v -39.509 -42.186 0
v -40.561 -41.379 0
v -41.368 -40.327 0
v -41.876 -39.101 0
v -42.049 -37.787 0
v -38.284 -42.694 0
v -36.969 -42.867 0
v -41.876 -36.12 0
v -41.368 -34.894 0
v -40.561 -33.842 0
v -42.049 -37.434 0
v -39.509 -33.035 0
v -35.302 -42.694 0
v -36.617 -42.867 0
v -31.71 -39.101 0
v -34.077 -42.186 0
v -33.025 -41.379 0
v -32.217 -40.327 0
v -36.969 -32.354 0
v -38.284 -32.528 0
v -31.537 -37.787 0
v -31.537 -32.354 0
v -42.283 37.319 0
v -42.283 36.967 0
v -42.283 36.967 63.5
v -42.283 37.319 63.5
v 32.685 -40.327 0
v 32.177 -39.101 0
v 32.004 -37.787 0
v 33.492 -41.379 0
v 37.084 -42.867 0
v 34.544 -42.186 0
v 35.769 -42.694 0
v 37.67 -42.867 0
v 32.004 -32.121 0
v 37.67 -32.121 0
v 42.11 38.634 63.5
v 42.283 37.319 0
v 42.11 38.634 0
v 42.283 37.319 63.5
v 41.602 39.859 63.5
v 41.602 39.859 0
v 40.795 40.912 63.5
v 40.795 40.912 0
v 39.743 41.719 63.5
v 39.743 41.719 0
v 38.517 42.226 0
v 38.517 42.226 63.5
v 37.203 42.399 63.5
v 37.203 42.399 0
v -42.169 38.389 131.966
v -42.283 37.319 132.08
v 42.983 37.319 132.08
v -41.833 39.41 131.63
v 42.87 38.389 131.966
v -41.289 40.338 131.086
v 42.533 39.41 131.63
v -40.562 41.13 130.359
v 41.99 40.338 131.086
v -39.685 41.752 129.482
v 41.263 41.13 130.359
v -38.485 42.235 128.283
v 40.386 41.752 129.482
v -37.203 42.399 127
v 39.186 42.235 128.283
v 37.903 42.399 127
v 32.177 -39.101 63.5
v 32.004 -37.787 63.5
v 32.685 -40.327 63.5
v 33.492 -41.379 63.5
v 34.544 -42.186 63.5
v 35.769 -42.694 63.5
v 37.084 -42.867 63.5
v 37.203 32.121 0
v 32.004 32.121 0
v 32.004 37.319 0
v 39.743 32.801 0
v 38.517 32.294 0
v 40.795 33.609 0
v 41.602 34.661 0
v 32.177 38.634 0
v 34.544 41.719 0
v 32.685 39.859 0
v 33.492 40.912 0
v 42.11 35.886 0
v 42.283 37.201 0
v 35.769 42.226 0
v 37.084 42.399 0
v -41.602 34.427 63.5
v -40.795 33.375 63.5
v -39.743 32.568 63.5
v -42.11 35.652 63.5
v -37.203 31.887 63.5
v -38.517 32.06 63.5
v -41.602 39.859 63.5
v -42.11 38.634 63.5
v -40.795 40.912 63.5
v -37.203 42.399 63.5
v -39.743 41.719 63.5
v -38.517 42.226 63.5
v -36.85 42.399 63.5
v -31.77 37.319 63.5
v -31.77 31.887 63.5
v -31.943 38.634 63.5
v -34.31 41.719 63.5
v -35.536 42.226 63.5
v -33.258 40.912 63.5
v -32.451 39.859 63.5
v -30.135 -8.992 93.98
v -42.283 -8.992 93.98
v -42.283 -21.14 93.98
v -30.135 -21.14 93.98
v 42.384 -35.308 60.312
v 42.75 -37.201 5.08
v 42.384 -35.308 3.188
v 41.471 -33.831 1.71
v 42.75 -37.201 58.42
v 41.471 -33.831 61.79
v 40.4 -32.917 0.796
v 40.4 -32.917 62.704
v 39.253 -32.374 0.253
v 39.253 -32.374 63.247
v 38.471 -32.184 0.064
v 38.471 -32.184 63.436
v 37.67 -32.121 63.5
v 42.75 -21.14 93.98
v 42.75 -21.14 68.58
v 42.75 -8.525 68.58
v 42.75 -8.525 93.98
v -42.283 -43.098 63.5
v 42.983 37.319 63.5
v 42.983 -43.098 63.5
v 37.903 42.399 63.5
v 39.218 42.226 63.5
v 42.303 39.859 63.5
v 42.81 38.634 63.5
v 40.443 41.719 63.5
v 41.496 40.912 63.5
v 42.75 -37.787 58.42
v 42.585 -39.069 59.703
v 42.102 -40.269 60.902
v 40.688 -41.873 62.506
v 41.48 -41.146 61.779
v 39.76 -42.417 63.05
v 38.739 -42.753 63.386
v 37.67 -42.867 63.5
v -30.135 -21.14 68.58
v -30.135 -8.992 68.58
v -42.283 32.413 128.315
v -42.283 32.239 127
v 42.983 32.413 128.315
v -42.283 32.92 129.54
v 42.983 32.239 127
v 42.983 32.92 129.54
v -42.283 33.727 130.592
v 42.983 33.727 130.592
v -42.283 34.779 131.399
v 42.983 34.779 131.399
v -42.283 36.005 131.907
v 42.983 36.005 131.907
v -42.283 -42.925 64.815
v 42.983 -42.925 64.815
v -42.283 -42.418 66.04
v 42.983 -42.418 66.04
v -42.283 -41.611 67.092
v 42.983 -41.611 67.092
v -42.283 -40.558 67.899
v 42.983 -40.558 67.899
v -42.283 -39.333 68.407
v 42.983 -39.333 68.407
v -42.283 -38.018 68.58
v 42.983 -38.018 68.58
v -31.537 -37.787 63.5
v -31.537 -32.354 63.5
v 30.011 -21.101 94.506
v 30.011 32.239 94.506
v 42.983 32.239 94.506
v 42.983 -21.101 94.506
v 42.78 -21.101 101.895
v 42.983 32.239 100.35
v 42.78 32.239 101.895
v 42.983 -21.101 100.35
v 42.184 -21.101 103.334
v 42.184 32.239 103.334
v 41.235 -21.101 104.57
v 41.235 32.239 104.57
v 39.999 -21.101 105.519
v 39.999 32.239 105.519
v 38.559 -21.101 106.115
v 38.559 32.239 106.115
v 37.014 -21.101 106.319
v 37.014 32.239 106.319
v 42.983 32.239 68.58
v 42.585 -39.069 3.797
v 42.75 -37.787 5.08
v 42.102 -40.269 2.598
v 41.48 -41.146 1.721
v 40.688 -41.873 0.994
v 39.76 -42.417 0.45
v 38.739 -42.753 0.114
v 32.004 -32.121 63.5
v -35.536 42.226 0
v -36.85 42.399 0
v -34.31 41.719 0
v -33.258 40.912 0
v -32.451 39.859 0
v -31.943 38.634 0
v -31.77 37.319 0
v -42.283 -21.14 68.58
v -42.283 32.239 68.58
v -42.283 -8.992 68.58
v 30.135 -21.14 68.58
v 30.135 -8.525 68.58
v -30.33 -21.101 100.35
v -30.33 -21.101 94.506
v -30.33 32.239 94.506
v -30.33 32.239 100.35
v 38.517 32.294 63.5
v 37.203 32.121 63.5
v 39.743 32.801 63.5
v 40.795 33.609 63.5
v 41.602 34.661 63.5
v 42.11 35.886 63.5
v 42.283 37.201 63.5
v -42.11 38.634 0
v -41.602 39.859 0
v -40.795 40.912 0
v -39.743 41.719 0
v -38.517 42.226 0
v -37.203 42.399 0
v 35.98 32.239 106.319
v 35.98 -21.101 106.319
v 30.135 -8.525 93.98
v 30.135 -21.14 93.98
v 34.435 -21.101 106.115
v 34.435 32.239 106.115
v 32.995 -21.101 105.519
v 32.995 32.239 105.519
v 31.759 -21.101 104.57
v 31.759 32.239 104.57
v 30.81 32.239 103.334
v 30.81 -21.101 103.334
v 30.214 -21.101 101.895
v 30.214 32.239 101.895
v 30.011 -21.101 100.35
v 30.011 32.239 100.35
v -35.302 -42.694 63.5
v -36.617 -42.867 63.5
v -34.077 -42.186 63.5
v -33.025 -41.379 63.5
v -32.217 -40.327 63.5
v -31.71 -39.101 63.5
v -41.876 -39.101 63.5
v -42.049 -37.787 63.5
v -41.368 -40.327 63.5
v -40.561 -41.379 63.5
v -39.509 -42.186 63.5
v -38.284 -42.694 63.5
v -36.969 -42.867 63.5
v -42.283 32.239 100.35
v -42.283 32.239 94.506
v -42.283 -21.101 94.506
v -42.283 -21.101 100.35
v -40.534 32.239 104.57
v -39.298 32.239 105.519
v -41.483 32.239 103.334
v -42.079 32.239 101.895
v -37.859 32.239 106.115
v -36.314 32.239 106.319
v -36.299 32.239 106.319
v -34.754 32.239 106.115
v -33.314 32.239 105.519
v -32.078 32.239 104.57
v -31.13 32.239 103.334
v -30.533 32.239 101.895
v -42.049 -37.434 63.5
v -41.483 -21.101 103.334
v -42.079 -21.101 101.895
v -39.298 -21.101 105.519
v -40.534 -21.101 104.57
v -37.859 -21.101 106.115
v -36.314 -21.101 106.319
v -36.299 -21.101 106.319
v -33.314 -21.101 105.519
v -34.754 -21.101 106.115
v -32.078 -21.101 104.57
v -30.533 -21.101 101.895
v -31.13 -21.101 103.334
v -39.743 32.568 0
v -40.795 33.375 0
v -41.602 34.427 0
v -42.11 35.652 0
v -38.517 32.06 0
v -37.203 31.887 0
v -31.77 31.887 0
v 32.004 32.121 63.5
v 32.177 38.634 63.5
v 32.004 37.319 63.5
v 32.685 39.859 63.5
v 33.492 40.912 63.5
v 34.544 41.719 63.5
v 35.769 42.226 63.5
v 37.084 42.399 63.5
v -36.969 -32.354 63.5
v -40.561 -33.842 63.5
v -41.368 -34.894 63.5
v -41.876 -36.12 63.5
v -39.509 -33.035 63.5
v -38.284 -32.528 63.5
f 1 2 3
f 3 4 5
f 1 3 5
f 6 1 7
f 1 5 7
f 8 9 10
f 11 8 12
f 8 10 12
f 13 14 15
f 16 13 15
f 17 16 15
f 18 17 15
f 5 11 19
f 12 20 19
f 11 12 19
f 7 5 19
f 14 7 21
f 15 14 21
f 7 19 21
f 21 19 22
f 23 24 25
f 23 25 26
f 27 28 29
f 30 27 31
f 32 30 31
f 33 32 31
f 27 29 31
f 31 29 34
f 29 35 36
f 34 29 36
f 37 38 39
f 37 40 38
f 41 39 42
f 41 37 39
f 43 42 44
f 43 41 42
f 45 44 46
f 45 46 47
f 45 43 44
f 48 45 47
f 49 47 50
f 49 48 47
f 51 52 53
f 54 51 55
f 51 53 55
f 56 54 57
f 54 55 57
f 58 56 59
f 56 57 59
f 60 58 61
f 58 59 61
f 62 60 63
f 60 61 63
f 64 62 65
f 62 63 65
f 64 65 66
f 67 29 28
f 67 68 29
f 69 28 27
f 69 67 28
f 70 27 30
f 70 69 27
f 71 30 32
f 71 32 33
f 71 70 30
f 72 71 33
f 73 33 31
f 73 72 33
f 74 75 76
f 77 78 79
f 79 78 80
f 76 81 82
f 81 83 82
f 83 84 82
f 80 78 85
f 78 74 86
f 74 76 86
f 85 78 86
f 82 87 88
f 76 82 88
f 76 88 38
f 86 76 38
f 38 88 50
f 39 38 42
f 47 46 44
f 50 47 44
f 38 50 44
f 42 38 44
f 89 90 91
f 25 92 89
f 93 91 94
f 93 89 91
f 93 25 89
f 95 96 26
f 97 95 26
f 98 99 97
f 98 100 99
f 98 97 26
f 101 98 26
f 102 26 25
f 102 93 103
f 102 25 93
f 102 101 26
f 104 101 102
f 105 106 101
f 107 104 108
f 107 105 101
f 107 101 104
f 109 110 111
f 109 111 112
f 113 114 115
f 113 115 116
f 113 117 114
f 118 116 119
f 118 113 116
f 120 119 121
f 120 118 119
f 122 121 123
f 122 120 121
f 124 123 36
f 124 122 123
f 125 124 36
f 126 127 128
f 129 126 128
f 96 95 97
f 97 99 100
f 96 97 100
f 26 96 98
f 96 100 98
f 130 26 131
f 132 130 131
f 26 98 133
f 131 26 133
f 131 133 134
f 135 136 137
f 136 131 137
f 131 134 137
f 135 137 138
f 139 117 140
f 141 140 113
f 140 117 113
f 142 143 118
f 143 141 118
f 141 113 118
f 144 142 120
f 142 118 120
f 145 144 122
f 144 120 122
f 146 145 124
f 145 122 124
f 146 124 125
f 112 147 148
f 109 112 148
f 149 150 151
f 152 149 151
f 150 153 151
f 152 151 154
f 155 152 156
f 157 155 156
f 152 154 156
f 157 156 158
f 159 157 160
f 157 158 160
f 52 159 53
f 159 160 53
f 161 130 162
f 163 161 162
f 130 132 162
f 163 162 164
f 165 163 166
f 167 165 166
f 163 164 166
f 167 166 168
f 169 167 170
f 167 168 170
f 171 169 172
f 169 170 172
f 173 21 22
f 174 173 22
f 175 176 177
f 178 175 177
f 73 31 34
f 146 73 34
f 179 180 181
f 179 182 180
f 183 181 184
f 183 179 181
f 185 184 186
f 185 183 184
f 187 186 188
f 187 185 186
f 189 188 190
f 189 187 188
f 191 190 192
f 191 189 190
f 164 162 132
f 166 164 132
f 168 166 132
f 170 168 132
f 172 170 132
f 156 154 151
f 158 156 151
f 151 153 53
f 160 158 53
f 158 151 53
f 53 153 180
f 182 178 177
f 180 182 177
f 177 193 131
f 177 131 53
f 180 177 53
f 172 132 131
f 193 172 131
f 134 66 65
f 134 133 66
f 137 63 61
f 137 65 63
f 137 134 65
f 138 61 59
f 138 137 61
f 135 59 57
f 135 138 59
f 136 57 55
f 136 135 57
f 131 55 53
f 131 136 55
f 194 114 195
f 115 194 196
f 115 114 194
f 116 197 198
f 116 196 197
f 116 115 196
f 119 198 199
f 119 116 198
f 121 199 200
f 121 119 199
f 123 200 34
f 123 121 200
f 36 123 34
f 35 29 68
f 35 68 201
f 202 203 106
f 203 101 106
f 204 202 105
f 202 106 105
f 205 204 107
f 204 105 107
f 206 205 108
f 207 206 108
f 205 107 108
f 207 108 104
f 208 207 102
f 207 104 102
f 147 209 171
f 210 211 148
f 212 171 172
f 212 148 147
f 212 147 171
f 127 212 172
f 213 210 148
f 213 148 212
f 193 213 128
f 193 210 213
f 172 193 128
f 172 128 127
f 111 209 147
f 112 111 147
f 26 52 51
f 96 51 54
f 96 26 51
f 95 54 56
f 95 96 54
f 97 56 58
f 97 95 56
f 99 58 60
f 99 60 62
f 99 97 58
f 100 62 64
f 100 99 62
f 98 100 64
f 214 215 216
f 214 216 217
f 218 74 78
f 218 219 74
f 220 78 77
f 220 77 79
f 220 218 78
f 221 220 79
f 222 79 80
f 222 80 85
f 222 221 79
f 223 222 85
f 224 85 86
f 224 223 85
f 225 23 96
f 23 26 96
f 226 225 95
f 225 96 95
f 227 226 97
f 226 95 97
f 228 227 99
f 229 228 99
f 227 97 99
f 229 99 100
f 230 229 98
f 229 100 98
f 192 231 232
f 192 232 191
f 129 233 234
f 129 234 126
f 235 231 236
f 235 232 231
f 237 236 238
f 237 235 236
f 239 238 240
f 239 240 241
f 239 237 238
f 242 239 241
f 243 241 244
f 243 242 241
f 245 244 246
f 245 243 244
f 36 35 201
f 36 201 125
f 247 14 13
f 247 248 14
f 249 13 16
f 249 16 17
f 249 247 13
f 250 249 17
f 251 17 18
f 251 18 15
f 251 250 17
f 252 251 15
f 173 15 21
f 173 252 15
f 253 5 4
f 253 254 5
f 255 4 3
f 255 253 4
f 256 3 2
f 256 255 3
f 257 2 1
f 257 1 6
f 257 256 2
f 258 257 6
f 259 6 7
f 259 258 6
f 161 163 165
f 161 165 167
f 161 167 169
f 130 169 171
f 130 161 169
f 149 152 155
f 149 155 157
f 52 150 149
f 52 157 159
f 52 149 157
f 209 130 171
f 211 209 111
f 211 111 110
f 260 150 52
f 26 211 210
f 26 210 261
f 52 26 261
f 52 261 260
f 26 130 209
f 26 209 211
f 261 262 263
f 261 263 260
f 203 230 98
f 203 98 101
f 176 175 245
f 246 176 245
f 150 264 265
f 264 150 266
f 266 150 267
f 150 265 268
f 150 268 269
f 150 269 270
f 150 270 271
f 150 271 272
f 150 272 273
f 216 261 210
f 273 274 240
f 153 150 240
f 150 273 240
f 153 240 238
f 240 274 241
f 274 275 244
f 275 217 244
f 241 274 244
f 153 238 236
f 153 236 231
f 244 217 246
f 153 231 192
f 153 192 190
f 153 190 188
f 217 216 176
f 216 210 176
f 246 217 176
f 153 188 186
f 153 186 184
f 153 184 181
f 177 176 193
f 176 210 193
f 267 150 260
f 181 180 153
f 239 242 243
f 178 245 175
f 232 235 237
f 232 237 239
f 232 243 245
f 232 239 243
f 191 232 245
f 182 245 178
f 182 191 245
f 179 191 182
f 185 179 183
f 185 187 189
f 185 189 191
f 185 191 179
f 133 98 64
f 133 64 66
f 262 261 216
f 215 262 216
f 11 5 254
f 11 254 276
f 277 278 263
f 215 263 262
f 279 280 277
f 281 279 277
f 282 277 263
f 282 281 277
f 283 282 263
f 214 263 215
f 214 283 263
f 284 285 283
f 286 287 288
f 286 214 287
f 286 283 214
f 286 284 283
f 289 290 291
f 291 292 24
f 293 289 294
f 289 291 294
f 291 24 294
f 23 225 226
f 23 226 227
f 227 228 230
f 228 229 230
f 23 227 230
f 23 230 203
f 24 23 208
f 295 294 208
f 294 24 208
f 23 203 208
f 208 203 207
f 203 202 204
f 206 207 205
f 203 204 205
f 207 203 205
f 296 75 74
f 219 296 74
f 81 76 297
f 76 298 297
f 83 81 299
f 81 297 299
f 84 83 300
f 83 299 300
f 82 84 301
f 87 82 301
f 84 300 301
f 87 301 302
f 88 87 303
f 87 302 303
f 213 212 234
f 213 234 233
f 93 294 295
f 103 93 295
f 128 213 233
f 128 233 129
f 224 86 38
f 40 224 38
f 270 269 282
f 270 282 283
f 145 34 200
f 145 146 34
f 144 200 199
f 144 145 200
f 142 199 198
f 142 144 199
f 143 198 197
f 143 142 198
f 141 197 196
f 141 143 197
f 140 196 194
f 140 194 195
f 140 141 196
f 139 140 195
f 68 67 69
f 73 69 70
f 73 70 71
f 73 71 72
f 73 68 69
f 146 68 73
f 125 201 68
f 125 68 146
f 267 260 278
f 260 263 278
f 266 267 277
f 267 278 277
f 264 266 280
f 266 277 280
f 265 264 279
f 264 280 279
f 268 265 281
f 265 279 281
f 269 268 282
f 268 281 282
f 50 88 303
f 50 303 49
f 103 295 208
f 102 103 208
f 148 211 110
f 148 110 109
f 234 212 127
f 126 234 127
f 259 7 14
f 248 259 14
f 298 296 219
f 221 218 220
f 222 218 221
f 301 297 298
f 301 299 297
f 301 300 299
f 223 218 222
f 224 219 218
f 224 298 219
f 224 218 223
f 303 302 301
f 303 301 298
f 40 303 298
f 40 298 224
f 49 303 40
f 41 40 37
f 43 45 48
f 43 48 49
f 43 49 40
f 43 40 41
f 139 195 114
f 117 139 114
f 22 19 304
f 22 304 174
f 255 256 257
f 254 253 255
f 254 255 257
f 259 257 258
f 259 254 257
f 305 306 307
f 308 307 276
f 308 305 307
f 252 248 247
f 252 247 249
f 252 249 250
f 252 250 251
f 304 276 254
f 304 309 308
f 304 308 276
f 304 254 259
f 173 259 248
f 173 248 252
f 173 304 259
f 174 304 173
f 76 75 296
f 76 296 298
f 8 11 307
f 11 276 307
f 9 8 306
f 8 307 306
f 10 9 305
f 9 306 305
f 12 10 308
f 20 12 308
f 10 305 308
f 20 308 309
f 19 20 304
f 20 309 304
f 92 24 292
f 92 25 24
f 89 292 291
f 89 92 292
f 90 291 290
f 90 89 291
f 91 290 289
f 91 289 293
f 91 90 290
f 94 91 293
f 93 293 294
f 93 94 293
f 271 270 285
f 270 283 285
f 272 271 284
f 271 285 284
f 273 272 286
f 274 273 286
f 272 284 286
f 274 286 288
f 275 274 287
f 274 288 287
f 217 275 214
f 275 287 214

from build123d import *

# Parameters (mm, degrees)
F0_W      = 10.5122625828
F0_H      = 10.5122663081
F0_W_2    = 10.2786570787
F0_H_2    = 10.278660804
F0_H_3    = 10.5122625828
F0_W_3    = 10.7458680868
F0_H_4    = 10.7458718121
F1_DEPTH  = 63.5
F2_W      = 85.2661281824
F2_H      = 85.4979269207
F3_DEPTH  = 5.08
F4_W      = 85.2661281824
F4_H      = 10.16
F5_DEPTH  = 63.5
F7_W      = 12.1475029737
F7_H      = 12.1475029737
F7_W_2    = 12.6147139817
F7_H_2    = 12.6147139817
F8_DEPTH  = 25.4
F9_W      = 11.9528304785
F9_H      = 11.8126645684
F9_W_2    = 12.9729062319
F10_DEPTH = 53.34
F11_R     = 5.07999
F11_2_R   = 5.07999
F12_R     = 5.08
F13_R     = 5.969


# Not quite as in the source:
# - a fillet or chamfer is up to 0.001 mm smaller than in the source, because OpenCascade refuses the exact size


with BuildPart() as f1:
    # F0 (on Top) → F1 (new body)
    with BuildSketch(Plane.XY):
        with Locations((-37.0265245438, 37.1433291584)):
            Rectangle(F0_W, F0_H)
        with Locations((37.1433272958, 37.2601319104)):
            Rectangle(F0_W_2, F0_H_2)
        with Locations((-36.7929190397, -37.6105420291)):
            Rectangle(F0_W, F0_H_3)
        with Locations((37.3769327998, -37.4937374145)):
            Rectangle(F0_W_3, F0_H_4)
    extrude(amount=F1_DEPTH)

    # F11#2 (radius 5.08 in the source; OpenCascade refuses exactly that, so slightly less here)
    f11_2_edges = [f1.edges().sort_by_distance(p)[0] for p in [
        (-42.282656, 42.399462, 31.75),
        (-42.282656, 31.887196, 31.75),
        (-42.04905, -42.866673, 31.75),
        (-42.04905, -32.354411, 31.75),
        (-31.536788, -42.866673, 31.75),
        (32.003999, -42.866673, 31.75),
        (42.749867, -42.866673, 31.75),
        (42.749867, -32.120802, 31.75),
        (42.749867, -37.493737, 0),
        (42.749867, -37.493737, 63.5),
        (42.282656, 42.399462, 31.75),
        (42.282656, 32.120802, 31.75),
        (32.003999, 42.399462, 31.75),
    ]]
    fillet(f11_2_edges, radius=F11_2_R)

    # F12
    f12_edges = [f1.edges().sort_by_distance(p)[0] for p in [
        (32.003999, 37.319472, 31.75),
        (-31.770393, 42.399462, 31.75),
        (-37.202666, 42.399462, 31.75),
        (-42.282656, 37.319472, 31.75),
    ]]
    fillet(f12_edges, radius=F12_R)


with BuildPart() as f3:
    # F2 (on face) → F3 (new body)
    with BuildSketch(Plane.XY.offset(63.5)):
        with Locations((0.3504082561, -0.3495011479)):
            Rectangle(F2_W, F2_H)
    extrude(amount=F3_DEPTH)

    # F4 (on face) → F5 (join)
    with BuildSketch(Plane.XY.offset(68.58)):
        with Locations((0.3504082561, 37.3194623125)):
            Rectangle(F4_W, F4_H)
    extrude(amount=F5_DEPTH)

    # F7 (on face) → F8 (join)
    with BuildSketch(Plane.XY.offset(68.58)):
        with Locations((-36.2089043483, -15.065764077)):
            Rectangle(F7_W, F7_H)
        with Locations((36.4425098523, -14.832158573)):
            Rectangle(F7_W_2, F7_H_2)
    extrude(amount=F8_DEPTH)

    # F9 (on face) → F10 (join)
    with BuildSketch(Plane.XZ.offset(-32.2394623125)):
        with Locations((-36.3062405959, 100.4123203456)):
            Rectangle(F9_W, F9_H)
        with Locations((36.4970192313, 100.4123203456)):
            Rectangle(F9_W_2, F9_H)
    extrude(amount=F10_DEPTH)

    # F11 (radius 5.08 in the source; OpenCascade refuses exactly that, so slightly less here)
    f11_edges = [f3.edges().sort_by_distance(p)[0] for p in [
        (0.350408, -43.098465, 68.58),
        (0.350408, 32.239462, 132.08),
        (0.350408, 42.399462, 132.08),
        (42.983472, 42.399462, 97.79),
        (-42.282656, 42.399462, 97.79),
    ]]
    fillet(f11_edges, radius=F11_R)

    # F13
    f13_edges = [f3.edges().sort_by_distance(p)[0] for p in [
        (-42.282656, 5.569462, 106.318653),
        (-30.329825, 5.569462, 106.318653),
        (30.010566, 5.569462, 106.318653),
        (42.983472, 5.569462, 106.318653),
    ]]
    fillet(f13_edges, radius=F13_R)


solid = Compound([f1.part, f3.part])
